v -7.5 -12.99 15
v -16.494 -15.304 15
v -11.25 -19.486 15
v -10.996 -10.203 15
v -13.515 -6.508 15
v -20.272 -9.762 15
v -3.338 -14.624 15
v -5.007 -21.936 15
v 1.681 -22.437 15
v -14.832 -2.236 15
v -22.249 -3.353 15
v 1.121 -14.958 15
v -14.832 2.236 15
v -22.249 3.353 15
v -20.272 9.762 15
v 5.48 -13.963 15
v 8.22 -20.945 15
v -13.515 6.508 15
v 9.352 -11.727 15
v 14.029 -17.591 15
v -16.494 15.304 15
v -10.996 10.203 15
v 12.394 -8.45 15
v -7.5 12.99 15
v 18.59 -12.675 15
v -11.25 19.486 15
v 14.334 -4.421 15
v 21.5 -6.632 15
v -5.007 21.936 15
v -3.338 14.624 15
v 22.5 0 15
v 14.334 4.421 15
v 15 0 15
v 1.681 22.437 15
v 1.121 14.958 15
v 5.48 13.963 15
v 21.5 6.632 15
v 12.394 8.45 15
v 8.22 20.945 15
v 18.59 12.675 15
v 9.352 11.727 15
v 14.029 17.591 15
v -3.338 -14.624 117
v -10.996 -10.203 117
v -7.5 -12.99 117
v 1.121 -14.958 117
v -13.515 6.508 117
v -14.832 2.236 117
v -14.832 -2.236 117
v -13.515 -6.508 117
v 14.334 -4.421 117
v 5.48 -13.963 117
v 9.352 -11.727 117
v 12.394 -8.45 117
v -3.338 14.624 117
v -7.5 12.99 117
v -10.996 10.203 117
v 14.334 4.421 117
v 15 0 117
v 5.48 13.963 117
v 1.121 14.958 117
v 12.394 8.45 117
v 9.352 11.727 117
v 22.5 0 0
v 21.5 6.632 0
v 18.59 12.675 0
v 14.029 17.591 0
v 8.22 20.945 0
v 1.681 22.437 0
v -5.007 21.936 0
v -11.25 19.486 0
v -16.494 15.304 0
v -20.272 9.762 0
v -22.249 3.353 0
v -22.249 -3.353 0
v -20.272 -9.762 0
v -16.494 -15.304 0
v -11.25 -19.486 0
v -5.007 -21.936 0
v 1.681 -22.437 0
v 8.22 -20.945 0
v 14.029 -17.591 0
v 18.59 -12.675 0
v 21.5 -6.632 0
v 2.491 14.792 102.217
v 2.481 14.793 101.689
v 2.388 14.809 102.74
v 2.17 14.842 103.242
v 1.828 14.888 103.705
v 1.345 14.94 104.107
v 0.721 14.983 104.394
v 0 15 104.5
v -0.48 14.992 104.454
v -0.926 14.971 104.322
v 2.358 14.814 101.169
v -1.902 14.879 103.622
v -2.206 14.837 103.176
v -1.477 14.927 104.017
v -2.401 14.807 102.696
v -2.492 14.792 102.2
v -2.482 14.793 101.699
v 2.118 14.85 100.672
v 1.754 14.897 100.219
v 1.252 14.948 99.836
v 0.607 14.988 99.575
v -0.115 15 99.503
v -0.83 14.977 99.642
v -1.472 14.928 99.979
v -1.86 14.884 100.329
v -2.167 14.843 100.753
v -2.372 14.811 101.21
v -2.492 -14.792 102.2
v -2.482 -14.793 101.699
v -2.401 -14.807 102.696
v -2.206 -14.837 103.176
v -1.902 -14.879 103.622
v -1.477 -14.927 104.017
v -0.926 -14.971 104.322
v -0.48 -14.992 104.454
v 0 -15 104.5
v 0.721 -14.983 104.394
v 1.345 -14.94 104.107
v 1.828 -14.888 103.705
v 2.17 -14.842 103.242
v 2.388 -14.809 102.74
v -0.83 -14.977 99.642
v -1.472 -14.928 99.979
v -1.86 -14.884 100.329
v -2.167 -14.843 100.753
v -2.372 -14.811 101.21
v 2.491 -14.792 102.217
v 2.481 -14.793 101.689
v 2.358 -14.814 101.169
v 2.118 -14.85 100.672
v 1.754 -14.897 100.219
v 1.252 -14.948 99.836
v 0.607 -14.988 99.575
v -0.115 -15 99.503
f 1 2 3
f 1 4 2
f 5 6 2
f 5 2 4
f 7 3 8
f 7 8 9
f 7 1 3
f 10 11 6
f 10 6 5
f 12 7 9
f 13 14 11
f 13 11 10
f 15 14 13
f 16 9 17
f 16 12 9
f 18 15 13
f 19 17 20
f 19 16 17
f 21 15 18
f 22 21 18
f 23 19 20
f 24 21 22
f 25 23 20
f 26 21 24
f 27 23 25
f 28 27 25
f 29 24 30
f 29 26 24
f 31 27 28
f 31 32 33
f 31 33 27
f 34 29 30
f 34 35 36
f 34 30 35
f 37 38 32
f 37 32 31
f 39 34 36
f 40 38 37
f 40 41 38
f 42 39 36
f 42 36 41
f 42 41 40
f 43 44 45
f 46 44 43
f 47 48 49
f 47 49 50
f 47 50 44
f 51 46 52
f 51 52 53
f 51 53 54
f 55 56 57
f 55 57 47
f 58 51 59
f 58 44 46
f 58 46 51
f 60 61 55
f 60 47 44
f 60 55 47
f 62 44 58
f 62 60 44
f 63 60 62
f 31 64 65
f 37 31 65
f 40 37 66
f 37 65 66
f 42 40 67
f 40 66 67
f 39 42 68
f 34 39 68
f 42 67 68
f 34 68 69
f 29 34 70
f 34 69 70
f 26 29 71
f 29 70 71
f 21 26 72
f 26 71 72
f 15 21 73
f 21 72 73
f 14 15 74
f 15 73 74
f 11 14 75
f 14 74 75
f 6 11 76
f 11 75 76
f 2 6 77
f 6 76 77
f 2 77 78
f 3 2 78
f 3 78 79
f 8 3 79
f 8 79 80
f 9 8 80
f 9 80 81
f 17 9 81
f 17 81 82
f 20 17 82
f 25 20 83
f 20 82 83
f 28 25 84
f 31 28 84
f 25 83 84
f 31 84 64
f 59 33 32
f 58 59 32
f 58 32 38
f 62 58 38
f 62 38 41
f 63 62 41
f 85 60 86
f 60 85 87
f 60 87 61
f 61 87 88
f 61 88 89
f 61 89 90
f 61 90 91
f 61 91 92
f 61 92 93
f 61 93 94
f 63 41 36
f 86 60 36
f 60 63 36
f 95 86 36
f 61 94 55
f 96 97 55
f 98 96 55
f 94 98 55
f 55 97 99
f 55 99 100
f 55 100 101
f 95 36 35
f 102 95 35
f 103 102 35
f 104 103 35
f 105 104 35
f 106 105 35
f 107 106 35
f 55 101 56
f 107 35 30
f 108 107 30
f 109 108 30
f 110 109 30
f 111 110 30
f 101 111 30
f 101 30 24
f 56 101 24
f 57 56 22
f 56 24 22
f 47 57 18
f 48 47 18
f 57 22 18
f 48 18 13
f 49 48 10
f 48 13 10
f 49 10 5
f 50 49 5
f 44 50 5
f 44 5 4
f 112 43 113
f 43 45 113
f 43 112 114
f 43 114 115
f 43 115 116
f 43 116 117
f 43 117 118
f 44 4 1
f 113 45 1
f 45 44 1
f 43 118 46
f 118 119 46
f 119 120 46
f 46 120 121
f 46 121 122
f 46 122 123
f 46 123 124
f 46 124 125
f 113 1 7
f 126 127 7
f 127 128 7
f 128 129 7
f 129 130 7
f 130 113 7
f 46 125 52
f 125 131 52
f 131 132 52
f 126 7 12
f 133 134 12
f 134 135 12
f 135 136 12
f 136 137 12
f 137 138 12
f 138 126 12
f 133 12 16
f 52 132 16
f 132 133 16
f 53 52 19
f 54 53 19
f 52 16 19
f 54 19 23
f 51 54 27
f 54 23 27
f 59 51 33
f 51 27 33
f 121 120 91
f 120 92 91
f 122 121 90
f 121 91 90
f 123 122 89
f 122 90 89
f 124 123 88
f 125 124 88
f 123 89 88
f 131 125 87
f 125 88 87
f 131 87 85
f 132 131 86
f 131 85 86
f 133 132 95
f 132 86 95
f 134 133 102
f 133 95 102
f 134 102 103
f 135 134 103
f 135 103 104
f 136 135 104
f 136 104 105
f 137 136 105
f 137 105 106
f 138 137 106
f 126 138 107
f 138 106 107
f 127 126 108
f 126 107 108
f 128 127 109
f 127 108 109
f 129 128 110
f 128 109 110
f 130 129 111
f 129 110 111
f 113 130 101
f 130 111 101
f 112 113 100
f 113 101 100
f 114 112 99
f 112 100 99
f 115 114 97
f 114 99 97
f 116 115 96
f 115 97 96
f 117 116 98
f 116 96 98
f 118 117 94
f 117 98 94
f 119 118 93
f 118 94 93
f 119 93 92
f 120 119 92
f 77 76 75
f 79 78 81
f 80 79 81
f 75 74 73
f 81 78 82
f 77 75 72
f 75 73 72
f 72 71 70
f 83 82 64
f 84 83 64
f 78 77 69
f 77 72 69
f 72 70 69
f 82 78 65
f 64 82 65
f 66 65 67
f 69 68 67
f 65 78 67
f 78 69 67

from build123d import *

# Parameters (mm, degrees)
SKETCH1_R           = 22.5
BOSS_EXTRUDE1_DEPTH = 15
SKETCH2_R           = 15
BOSS_EXTRUDE2_DEPTH = 102
SKETCH3_R           = 2.5
CUT_EXTRUDE1_DEPTH  = 51


with BuildPart() as part:
    # Sketch1 → Boss-Extrude1 (new body)
    with BuildSketch(Plane.XY):
        Circle(SKETCH1_R)
    extrude(amount=BOSS_EXTRUDE1_DEPTH)

    # Sketch2 → Boss-Extrude2 (add)
    with BuildSketch(Plane.XY.offset(15)):
        Circle(SKETCH2_R)
    extrude(amount=BOSS_EXTRUDE2_DEPTH)

    # Sketch3 → Cut-Extrude1 (cut, symmetric)
    with BuildSketch(Plane(origin=(0, 0, 0), x_dir=(1, 0, 0), z_dir=(0, 1, 0))):
        with Locations(Location((0, -102, 0), (0, 0, 270))):
            Circle(SKETCH3_R)
    extrude(amount=CUT_EXTRUDE1_DEPTH, both=True, mode=Mode.SUBTRACT)


solid = part.part
